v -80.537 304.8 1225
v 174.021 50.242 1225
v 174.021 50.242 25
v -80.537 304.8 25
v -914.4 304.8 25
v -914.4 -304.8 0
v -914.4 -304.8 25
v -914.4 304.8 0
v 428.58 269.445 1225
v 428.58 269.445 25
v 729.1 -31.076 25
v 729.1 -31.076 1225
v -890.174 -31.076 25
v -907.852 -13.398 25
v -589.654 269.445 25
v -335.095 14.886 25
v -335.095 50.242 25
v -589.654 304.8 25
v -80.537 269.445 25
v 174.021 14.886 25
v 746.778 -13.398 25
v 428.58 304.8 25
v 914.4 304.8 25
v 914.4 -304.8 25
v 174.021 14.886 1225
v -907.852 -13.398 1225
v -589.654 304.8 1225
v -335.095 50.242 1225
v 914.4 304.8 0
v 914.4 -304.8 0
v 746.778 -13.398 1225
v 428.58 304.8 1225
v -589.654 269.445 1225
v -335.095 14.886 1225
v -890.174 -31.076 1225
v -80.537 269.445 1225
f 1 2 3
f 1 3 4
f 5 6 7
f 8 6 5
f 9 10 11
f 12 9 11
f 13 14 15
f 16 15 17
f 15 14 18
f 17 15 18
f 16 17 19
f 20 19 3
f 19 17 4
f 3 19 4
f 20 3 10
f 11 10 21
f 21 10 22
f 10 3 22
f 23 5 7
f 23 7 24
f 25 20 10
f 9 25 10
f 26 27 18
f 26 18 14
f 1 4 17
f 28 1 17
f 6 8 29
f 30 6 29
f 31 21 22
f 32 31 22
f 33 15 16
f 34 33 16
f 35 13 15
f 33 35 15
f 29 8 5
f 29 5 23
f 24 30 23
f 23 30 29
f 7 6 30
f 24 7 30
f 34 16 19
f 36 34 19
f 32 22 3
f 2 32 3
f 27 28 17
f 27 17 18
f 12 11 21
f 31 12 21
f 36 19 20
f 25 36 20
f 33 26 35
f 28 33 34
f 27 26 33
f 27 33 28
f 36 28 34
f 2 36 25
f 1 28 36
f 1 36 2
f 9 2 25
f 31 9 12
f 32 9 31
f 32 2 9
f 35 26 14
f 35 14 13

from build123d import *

# Parameters (mm, degrees)
F0_W     = 1828.8
F0_H     = 609.6
F1_DEPTH = 25
F3_DEPTH = 1200


with BuildPart() as f1:
    # F0 (on Top) → F1 (new body)
    with BuildSketch(Plane.XY):
        Rectangle(F0_W, F0_H)
    extrude(amount=F1_DEPTH)


with BuildPart() as f3:
    # F2 (on face) → F3 (new body)
    with BuildSketch(Plane.XY.offset(25)):
        Polygon((-335.095461, 50.241559), (-589.653902, 304.8), (-907.851953, -13.398052), (-890.174284, -31.075721), (-589.653902, 269.444661), (-335.095461, 14.88622), (-80.537019, 269.444661), (174.021422, 14.88622), (428.579863, 269.444661), (729.100245, -31.075721), (746.777915, -13.398052), (428.579863, 304.8), (174.021422, 50.241559), (-80.537019, 304.8), align=None)
    extrude(amount=F3_DEPTH)


solid = Compound([f1.part, f3.part])
